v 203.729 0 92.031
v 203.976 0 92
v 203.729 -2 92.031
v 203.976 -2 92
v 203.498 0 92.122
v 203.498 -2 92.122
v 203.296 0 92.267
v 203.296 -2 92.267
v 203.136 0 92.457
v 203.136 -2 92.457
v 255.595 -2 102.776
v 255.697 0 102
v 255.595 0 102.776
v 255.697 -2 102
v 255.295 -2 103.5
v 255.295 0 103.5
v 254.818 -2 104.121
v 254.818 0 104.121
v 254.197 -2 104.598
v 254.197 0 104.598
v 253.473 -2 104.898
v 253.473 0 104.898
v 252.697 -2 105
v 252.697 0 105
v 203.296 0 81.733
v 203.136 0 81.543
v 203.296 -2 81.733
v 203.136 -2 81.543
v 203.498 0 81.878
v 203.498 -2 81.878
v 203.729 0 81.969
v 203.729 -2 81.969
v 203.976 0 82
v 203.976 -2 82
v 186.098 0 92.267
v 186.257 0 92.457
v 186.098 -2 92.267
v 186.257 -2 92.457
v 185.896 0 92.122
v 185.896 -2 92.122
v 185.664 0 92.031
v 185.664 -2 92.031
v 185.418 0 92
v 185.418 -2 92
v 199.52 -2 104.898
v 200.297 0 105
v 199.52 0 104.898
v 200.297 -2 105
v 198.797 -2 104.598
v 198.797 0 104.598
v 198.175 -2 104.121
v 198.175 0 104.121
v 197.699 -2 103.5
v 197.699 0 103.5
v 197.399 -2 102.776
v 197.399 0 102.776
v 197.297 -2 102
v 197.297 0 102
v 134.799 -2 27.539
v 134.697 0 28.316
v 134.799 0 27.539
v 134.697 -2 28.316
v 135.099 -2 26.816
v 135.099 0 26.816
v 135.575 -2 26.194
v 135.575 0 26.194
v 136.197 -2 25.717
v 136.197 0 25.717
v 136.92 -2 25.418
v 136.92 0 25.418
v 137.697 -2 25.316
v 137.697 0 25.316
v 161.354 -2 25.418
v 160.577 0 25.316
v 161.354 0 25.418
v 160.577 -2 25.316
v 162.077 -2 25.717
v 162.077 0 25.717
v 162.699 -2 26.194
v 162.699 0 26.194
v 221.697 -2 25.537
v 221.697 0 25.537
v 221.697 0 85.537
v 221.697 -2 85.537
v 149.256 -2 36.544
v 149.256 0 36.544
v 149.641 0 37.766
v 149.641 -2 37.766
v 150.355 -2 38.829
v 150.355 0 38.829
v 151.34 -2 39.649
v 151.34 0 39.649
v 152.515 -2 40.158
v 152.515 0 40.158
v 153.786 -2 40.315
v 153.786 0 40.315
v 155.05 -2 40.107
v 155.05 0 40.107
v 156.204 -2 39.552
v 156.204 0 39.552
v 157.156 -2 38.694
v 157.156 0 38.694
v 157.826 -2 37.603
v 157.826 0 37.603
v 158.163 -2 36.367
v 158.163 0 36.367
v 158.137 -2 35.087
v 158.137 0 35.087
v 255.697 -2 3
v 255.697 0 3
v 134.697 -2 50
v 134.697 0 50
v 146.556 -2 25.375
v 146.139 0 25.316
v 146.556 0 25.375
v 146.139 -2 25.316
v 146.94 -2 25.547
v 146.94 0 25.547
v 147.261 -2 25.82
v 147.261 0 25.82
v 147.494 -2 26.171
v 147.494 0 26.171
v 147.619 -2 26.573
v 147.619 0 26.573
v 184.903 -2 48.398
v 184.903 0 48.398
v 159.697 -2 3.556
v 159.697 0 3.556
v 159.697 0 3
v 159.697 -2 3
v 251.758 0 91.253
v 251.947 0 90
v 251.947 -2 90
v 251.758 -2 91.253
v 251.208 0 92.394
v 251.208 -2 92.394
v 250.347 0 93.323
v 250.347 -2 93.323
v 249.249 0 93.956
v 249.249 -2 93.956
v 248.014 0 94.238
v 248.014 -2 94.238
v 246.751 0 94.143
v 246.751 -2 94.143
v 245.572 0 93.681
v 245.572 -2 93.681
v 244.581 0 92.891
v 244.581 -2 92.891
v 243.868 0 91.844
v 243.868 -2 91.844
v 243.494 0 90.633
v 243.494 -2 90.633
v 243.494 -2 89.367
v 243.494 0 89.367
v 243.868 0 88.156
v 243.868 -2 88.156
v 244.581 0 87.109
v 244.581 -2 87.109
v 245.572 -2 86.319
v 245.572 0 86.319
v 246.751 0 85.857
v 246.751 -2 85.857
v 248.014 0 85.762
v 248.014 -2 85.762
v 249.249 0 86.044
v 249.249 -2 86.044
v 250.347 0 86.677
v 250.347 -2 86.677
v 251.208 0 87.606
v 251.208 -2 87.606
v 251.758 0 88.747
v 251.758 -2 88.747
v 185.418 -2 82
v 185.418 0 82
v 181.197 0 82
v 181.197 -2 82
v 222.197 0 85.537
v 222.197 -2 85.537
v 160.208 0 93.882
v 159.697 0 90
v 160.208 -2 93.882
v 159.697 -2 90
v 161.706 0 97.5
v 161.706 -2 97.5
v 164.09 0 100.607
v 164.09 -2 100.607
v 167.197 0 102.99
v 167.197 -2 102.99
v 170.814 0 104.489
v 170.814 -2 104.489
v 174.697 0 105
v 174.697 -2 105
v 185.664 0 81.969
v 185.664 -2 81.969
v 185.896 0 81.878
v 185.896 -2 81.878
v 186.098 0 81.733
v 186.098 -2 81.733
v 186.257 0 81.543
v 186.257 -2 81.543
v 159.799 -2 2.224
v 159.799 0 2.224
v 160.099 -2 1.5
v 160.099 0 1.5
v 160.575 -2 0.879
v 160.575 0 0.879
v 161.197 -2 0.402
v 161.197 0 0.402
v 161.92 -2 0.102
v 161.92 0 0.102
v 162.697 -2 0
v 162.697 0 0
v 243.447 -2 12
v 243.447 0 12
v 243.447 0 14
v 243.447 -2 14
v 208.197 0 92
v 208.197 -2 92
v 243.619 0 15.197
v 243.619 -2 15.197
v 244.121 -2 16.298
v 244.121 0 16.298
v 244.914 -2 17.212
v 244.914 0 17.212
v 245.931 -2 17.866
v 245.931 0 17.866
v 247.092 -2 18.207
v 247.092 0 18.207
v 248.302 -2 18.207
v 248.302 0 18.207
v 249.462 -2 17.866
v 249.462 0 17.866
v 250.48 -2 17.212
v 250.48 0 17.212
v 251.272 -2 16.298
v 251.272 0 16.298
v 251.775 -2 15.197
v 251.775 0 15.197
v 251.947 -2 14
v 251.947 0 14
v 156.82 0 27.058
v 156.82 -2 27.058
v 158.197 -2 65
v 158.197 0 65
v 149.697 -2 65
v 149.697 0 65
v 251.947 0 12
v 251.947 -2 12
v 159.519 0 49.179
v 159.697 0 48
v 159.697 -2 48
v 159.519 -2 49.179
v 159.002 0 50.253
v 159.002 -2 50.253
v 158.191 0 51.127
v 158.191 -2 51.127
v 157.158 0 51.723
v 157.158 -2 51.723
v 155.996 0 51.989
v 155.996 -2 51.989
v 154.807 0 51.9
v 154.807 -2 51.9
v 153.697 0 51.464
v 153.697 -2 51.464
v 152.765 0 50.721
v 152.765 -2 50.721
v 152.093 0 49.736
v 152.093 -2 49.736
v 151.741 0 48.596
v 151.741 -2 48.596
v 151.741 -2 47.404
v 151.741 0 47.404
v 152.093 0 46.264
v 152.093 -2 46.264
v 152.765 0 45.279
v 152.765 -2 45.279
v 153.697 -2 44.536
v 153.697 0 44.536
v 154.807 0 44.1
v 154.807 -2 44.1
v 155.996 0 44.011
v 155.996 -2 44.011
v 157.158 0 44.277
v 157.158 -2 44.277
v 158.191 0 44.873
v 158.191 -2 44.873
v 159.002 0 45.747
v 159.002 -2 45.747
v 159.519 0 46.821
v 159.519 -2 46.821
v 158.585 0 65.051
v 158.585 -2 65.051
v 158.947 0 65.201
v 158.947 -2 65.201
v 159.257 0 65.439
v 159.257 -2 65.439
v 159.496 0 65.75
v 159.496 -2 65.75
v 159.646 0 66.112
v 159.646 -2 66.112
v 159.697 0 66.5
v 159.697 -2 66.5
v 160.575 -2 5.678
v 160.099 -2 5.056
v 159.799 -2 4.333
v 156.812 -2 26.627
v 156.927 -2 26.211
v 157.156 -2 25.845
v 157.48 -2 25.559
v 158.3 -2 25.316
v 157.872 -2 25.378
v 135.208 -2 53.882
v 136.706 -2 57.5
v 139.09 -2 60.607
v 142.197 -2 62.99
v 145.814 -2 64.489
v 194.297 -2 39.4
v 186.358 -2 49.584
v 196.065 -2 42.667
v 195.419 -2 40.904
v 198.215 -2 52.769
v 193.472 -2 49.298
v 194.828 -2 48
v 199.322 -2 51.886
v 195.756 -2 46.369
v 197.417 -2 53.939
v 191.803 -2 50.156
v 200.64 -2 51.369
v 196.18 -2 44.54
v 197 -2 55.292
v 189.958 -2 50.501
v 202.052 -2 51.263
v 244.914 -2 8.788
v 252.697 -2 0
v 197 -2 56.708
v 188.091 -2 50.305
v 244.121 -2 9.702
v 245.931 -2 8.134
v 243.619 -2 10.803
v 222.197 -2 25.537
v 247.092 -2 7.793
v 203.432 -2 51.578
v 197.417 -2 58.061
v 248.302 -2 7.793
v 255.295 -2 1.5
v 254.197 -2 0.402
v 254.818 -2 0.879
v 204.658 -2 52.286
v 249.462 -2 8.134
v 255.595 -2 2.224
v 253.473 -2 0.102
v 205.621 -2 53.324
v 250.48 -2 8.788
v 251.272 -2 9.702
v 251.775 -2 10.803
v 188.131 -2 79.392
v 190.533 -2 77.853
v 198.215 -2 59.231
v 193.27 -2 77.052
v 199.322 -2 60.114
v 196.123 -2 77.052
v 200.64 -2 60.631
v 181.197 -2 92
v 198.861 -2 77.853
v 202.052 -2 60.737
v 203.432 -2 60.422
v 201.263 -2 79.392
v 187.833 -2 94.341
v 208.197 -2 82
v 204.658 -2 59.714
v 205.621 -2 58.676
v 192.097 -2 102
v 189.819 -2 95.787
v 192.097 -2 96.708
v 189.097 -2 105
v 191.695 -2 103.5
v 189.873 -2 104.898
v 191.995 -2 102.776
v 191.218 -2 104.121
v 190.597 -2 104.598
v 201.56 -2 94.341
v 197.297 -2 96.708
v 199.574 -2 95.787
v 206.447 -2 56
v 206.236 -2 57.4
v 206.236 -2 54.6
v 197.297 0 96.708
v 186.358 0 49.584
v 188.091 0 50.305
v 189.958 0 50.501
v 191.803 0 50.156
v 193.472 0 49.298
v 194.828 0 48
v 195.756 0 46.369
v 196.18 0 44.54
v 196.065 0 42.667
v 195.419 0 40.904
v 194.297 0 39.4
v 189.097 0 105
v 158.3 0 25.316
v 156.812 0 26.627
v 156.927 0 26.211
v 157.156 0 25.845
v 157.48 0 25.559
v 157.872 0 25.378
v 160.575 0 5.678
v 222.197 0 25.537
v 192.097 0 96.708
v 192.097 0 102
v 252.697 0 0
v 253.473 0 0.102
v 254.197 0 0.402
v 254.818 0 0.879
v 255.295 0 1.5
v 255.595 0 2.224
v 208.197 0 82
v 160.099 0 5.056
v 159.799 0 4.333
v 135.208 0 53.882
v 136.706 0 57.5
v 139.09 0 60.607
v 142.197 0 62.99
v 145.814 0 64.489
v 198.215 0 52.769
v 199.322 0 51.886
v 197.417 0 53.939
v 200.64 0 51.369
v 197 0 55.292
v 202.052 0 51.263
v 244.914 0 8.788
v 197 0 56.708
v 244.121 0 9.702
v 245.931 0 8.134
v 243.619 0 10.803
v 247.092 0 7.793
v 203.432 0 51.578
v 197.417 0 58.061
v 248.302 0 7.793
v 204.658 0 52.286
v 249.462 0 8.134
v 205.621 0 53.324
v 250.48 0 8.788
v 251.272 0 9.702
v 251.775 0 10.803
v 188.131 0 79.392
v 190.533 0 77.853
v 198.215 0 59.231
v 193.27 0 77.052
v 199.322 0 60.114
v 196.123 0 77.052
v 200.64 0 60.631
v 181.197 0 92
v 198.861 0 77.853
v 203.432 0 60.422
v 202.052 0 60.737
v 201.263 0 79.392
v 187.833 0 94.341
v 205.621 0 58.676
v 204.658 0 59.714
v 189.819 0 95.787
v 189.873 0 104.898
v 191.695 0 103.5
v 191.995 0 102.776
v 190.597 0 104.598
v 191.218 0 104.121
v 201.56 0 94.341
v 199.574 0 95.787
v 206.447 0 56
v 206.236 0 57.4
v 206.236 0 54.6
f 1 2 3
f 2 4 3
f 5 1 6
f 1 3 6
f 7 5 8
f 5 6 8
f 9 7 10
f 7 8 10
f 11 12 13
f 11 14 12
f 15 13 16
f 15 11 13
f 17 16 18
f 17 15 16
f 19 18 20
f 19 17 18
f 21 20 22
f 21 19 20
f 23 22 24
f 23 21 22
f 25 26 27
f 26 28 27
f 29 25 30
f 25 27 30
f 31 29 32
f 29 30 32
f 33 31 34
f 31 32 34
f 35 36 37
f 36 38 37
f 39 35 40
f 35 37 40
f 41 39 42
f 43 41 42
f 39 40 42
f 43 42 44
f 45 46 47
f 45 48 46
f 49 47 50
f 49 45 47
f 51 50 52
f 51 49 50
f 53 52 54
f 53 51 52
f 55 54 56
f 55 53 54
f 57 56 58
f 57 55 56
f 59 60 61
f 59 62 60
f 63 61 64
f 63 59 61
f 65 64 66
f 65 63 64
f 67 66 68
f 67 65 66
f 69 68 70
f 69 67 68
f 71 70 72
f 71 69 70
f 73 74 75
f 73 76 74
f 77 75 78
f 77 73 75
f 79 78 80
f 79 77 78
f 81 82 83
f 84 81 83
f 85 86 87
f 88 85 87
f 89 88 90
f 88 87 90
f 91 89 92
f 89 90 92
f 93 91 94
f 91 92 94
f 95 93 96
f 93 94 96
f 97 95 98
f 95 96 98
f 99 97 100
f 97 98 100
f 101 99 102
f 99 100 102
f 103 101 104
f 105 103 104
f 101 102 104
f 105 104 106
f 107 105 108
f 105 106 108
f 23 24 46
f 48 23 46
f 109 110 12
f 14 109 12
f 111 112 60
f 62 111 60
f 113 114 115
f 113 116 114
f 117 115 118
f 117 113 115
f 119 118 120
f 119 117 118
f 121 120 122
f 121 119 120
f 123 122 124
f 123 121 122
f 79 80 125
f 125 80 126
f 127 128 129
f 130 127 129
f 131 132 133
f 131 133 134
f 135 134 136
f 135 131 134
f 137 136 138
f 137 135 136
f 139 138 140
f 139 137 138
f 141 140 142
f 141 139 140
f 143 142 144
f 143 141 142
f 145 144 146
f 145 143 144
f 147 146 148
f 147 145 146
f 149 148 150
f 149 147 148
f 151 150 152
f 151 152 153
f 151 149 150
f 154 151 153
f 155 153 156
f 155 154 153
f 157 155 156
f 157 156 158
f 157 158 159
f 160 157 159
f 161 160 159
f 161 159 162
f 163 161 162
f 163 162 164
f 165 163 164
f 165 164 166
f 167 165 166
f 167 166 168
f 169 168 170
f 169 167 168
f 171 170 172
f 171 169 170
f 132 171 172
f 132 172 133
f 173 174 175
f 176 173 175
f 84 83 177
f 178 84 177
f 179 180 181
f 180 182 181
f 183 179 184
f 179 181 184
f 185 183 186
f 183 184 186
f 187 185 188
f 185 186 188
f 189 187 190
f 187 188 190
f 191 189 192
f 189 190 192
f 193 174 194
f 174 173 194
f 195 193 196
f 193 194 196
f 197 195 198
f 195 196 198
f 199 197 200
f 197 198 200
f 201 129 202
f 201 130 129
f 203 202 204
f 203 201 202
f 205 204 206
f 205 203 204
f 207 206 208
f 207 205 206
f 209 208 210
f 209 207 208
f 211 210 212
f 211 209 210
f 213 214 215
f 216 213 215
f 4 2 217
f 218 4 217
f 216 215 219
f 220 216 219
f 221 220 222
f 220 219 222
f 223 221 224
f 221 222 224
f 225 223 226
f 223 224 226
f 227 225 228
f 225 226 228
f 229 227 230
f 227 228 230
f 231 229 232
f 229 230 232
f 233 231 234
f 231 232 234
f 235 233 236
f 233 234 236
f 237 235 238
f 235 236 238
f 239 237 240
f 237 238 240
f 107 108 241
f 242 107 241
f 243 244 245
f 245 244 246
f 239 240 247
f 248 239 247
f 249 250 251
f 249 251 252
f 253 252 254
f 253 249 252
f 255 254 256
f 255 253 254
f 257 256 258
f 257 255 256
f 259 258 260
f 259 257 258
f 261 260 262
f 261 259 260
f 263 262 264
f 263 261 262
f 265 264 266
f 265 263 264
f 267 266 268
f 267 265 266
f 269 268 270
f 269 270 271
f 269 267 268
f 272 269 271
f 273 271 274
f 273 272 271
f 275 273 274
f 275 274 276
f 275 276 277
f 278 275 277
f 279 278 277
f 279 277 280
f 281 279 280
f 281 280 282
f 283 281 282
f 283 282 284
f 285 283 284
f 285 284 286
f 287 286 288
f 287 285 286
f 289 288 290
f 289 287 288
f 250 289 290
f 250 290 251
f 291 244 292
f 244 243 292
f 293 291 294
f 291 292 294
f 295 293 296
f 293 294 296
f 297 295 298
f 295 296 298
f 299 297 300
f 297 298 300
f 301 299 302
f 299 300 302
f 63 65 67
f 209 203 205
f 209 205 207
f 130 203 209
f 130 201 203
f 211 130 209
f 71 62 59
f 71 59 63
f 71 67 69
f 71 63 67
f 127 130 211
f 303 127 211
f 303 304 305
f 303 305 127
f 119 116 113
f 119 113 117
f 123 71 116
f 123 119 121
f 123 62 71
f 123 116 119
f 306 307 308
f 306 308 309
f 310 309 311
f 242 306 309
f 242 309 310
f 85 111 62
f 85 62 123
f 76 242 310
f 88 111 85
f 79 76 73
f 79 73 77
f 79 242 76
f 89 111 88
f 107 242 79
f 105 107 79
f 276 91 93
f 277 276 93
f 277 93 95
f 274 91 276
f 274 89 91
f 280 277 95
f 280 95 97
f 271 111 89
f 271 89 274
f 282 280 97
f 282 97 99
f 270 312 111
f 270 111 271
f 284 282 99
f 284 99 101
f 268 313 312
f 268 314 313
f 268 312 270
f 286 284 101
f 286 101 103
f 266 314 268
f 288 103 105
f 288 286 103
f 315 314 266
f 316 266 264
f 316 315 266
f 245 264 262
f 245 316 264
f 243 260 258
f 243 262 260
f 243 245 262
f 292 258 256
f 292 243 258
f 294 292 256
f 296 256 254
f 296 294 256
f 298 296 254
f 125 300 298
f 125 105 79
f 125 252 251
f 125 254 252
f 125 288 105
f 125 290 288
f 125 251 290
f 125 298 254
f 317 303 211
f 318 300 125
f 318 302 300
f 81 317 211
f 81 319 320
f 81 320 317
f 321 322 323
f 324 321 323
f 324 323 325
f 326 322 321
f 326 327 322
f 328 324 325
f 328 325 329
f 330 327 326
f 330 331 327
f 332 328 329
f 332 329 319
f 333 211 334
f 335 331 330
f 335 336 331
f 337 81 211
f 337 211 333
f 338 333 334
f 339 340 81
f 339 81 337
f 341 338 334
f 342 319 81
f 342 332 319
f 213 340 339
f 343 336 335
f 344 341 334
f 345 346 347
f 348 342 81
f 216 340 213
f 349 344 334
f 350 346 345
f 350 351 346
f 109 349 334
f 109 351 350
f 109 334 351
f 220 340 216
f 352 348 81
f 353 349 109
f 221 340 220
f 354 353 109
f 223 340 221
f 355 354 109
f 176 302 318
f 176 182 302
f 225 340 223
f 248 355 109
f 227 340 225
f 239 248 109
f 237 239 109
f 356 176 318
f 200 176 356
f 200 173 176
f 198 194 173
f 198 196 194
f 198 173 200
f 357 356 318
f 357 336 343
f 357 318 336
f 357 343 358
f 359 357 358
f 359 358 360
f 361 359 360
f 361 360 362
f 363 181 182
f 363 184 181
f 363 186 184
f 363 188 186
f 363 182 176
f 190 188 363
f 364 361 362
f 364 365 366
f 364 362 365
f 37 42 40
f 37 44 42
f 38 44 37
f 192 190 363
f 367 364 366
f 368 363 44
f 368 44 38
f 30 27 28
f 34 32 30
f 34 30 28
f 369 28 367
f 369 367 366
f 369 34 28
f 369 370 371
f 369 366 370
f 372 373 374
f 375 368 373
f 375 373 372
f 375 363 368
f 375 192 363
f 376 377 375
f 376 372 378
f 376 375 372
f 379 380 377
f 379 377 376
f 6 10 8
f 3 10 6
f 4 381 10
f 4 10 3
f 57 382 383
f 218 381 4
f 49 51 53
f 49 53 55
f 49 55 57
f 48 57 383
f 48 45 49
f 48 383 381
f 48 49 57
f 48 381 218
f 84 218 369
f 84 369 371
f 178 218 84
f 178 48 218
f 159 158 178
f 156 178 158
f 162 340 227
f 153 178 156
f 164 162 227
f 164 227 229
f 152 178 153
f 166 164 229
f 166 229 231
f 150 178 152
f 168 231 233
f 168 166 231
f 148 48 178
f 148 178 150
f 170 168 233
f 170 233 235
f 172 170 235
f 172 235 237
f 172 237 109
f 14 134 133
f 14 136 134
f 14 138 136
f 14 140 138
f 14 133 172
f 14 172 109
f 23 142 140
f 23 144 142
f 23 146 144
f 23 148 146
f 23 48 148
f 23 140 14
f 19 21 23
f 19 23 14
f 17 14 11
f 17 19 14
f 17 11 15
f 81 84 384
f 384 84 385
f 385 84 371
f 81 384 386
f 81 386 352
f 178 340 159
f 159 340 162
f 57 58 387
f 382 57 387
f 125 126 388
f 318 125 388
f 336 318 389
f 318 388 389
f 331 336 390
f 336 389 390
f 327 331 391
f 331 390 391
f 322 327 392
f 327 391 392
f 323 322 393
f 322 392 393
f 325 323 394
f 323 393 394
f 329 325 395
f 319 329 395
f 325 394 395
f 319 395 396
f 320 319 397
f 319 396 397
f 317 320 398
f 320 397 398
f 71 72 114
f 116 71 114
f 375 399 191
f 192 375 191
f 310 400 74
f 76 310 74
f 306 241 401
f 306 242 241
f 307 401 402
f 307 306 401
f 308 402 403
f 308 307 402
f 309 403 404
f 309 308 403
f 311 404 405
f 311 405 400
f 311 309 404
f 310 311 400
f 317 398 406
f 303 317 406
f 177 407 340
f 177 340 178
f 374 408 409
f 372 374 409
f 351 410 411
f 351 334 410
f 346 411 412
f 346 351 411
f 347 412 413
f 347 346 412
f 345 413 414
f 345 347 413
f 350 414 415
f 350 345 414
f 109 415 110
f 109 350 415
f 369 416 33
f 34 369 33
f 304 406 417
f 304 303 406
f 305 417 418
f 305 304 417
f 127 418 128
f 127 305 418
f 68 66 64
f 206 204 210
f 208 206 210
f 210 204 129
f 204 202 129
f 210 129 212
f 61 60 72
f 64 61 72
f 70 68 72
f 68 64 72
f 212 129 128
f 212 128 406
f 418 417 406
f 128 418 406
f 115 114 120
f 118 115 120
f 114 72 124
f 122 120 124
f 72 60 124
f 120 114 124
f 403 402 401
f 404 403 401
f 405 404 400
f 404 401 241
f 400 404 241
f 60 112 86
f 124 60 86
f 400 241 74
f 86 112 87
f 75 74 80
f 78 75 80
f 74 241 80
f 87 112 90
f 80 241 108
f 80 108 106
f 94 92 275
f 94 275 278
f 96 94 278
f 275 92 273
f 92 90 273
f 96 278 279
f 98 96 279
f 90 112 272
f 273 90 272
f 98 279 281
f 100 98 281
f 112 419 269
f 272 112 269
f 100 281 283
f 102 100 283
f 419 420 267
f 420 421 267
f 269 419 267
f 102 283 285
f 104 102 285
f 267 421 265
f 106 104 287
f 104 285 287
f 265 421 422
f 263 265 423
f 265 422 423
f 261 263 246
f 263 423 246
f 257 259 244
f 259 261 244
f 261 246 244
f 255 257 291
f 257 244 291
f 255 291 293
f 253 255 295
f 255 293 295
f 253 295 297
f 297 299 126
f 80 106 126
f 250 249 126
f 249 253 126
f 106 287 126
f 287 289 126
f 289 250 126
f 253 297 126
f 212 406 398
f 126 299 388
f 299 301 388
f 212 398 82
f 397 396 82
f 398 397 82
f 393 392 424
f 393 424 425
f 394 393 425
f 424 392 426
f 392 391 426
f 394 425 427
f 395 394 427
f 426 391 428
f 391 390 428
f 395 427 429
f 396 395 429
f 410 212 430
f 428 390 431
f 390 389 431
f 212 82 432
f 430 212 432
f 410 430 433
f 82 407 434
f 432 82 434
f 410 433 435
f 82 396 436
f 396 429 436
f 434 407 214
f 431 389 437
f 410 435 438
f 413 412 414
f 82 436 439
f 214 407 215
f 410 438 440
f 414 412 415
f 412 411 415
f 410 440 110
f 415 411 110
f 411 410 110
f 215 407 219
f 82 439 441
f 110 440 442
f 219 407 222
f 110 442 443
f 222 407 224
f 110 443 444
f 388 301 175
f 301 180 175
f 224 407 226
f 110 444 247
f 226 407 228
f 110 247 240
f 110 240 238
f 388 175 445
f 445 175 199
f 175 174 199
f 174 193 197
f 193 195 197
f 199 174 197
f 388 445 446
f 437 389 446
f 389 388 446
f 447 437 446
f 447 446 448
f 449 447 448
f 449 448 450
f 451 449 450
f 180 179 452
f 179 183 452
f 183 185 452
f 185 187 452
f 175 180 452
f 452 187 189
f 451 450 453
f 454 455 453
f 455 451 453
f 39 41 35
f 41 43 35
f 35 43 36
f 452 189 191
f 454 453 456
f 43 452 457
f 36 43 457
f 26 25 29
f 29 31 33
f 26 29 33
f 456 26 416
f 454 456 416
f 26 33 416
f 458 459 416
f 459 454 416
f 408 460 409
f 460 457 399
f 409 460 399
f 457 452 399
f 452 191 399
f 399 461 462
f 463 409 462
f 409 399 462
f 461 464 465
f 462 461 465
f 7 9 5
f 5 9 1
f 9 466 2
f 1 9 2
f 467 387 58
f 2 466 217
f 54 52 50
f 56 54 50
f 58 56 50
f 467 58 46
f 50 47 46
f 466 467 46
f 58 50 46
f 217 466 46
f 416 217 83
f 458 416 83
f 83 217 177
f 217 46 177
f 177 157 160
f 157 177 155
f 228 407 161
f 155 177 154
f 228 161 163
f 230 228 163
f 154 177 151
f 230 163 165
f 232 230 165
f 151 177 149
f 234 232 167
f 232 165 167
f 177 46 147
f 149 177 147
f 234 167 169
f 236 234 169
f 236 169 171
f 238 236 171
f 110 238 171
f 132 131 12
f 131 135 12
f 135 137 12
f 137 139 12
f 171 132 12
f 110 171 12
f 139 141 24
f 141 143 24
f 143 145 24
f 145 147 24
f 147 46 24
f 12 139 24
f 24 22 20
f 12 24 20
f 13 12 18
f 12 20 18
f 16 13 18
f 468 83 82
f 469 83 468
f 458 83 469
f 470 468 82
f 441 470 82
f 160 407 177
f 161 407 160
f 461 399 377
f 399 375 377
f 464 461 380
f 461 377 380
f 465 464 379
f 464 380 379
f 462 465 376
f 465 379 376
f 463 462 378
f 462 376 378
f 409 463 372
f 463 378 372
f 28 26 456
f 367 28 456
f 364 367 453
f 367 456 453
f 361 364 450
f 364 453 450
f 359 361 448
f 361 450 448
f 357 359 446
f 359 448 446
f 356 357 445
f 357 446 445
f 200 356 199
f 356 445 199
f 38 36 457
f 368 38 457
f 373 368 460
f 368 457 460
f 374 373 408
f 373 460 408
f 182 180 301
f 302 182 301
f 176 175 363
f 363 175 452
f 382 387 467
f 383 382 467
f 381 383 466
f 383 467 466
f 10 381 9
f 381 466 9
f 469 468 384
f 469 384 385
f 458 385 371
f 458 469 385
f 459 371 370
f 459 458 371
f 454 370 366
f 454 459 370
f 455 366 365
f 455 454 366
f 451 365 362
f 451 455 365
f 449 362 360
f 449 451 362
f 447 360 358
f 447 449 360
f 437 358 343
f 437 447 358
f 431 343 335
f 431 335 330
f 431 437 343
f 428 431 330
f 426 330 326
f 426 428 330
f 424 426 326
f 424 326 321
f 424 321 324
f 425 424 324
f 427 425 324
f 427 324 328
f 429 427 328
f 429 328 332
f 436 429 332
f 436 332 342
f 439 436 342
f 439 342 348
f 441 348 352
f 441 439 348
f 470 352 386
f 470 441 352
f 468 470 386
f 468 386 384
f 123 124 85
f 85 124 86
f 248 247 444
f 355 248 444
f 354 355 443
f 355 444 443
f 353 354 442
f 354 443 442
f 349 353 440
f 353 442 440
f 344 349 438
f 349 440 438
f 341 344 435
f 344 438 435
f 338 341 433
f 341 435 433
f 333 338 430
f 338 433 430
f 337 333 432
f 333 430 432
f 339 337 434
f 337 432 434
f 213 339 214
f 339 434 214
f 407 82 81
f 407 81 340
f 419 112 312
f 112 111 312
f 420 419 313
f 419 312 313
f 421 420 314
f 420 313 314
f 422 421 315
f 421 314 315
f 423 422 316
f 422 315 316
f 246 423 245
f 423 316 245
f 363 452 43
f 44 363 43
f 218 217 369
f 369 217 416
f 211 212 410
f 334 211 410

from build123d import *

# Parameters (mm, degrees)
F0_R     = 4
F0_R_2   = 4.75
F0_W     = 0.5
F0_H     = 60
F0_R_3   = 4.25
F1_DEPTH = 2
F2_R     = 15
F3_R     = 3
F4_R     = 1.5
F5_R     = 1


# Not quite as in the source:
# - a feature names something its author has since deleted; it is built from what else it names


with BuildPart() as f1:
    # F0 (on Front) → F1 (new body)
    with BuildSketch(Plane.XZ):
        with BuildLine():
            Line((159.6967741251, 4.7991039181), (159.6967741251, 0))
            Line((159.6967741251, 0), (255.6967741251, 0))
            Line((255.6967741251, 0), (255.6967741251, 105))
            Line((255.6967741251, 105), (197.2967741251, 105))
            Line((197.2967741251, 105), (197.2967741251, 96.7078576421))
            ThreePointArc((197.2967741251, 96.7078576421), (200.8257976645, 94.9647705839), (203.4147153958, 92))
            Line((203.4147153958, 92), (208.1967741251, 92))
            Line((208.1967741251, 92), (208.1967741251, 82))
            Line((208.1967741251, 82), (203.4147153958, 82))
            ThreePointArc((203.4147153958, 82), (194.6967741251, 76.95), (185.9788328544, 82))
            Line((185.9788328544, 82), (181.1967741251, 82))
            Line((181.1967741251, 82), (181.1967741251, 92))
            Line((181.1967741251, 92), (185.9788328544, 92))
            ThreePointArc((185.9788328544, 92), (188.5677505857, 94.9647705839), (192.0967741251, 96.7078576421))
            Line((192.0967741251, 96.7078576421), (192.0967741251, 105))
            Line((192.0967741251, 105), (159.6967741251, 105))
            Line((159.6967741251, 105), (159.6967741251, 65))
            Line((159.6967741251, 65), (134.6967741251, 65))
            Line((134.6967741251, 65), (134.6967741251, 25.3155251003))
            Line((134.6967741251, 25.3155251003), (147.4130505224, 25.3155251003))
            Line((147.4130505224, 25.3155251003), (149.2561978018, 36.5444159815))
            ThreePointArc((149.2561978018, 36.5444159815), (154.4256650063, 40.2561014236), (158.1373504484, 35.0866342191))
            Line((158.1373504484, 35.0866342191), (156.5334882879, 25.3155251003))
            Line((156.5334882879, 25.3155251003), (161.81991107, 25.3155251003))
            Line((161.81991107, 25.3155251003), (163.0631786775, 26.5587927078))
            Line((163.0631786775, 26.5587927078), (184.9027867776, 48.3984008079))
            ThreePointArc((184.9027867776, 48.3984008079), (194.1972390474, 48.6983039321), (194.2972221661, 39.399551959))
            Line((194.2972221661, 39.399551959), (159.6967741251, 4.7991039181))
        make_face()
        with Locations((155.6967741251, 48)):
            Circle(F0_R, mode=Mode.SUBTRACT)
        with BuildLine():
            ThreePointArc((251.9467741251, 12), (247.6967741251, 7.75), (243.4467741251, 12))
            Line((243.4467741251, 12), (243.4467741251, 14))
            ThreePointArc((243.4467741251, 14), (247.6967741251, 18.25), (251.9467741251, 14))
            Line((251.9467741251, 14), (251.9467741251, 12))
        make_face(mode=Mode.SUBTRACT)
        with Locations((201.6967741251, 56)):
            Circle(F0_R_2, mode=Mode.SUBTRACT)
        with Locations((221.9467741251, 55.5368482322)):
            Rectangle(F0_W, F0_H, mode=Mode.SUBTRACT)
        with Locations((247.6967741251, 90)):
            Circle(F0_R_3, mode=Mode.SUBTRACT)
    extrude(amount=F1_DEPTH)

    # F2
    f2_edges = [f1.edges().sort_by_distance(p)[0] for p in [
        (134.696774, -1, 65),
        (159.696774, -1, 105),
    ]]
    fillet(f2_edges, radius=F2_R)

    # F3
    f3_edges = [f1.edges().sort_by_distance(p)[0] for p in [
        (255.696774, -1, 105),
        (255.696774, -1, 0),
        (197.296774, -1, 105),
        (192.096774, -1, 105),
        (161.819911, -1, 25.315525),
        (159.696774, -1, 4.799104),
        (159.696774, -1, 0),
        (134.696774, -1, 25.315525),
    ]]
    fillet(f3_edges, radius=F3_R)

    # F4
    f4_edges = [f1.edges().sort_by_distance(p)[0] for p in [
        (147.413051, -1, 25.315525),
        (156.533488, -1, 25.315525),
        (159.696774, -1, 65),
    ]]
    fillet(f4_edges, radius=F4_R)

    # F5
    f5_edges = [f1.edges().sort_by_distance(p)[0] for p in [
        (185.978833, -1, 92),
        (185.978833, -1, 82),
        (203.414715, -1, 92),
        (203.414715, -1, 82),
    ]]
    fillet(f5_edges, radius=F5_R)


solid = f1.part
